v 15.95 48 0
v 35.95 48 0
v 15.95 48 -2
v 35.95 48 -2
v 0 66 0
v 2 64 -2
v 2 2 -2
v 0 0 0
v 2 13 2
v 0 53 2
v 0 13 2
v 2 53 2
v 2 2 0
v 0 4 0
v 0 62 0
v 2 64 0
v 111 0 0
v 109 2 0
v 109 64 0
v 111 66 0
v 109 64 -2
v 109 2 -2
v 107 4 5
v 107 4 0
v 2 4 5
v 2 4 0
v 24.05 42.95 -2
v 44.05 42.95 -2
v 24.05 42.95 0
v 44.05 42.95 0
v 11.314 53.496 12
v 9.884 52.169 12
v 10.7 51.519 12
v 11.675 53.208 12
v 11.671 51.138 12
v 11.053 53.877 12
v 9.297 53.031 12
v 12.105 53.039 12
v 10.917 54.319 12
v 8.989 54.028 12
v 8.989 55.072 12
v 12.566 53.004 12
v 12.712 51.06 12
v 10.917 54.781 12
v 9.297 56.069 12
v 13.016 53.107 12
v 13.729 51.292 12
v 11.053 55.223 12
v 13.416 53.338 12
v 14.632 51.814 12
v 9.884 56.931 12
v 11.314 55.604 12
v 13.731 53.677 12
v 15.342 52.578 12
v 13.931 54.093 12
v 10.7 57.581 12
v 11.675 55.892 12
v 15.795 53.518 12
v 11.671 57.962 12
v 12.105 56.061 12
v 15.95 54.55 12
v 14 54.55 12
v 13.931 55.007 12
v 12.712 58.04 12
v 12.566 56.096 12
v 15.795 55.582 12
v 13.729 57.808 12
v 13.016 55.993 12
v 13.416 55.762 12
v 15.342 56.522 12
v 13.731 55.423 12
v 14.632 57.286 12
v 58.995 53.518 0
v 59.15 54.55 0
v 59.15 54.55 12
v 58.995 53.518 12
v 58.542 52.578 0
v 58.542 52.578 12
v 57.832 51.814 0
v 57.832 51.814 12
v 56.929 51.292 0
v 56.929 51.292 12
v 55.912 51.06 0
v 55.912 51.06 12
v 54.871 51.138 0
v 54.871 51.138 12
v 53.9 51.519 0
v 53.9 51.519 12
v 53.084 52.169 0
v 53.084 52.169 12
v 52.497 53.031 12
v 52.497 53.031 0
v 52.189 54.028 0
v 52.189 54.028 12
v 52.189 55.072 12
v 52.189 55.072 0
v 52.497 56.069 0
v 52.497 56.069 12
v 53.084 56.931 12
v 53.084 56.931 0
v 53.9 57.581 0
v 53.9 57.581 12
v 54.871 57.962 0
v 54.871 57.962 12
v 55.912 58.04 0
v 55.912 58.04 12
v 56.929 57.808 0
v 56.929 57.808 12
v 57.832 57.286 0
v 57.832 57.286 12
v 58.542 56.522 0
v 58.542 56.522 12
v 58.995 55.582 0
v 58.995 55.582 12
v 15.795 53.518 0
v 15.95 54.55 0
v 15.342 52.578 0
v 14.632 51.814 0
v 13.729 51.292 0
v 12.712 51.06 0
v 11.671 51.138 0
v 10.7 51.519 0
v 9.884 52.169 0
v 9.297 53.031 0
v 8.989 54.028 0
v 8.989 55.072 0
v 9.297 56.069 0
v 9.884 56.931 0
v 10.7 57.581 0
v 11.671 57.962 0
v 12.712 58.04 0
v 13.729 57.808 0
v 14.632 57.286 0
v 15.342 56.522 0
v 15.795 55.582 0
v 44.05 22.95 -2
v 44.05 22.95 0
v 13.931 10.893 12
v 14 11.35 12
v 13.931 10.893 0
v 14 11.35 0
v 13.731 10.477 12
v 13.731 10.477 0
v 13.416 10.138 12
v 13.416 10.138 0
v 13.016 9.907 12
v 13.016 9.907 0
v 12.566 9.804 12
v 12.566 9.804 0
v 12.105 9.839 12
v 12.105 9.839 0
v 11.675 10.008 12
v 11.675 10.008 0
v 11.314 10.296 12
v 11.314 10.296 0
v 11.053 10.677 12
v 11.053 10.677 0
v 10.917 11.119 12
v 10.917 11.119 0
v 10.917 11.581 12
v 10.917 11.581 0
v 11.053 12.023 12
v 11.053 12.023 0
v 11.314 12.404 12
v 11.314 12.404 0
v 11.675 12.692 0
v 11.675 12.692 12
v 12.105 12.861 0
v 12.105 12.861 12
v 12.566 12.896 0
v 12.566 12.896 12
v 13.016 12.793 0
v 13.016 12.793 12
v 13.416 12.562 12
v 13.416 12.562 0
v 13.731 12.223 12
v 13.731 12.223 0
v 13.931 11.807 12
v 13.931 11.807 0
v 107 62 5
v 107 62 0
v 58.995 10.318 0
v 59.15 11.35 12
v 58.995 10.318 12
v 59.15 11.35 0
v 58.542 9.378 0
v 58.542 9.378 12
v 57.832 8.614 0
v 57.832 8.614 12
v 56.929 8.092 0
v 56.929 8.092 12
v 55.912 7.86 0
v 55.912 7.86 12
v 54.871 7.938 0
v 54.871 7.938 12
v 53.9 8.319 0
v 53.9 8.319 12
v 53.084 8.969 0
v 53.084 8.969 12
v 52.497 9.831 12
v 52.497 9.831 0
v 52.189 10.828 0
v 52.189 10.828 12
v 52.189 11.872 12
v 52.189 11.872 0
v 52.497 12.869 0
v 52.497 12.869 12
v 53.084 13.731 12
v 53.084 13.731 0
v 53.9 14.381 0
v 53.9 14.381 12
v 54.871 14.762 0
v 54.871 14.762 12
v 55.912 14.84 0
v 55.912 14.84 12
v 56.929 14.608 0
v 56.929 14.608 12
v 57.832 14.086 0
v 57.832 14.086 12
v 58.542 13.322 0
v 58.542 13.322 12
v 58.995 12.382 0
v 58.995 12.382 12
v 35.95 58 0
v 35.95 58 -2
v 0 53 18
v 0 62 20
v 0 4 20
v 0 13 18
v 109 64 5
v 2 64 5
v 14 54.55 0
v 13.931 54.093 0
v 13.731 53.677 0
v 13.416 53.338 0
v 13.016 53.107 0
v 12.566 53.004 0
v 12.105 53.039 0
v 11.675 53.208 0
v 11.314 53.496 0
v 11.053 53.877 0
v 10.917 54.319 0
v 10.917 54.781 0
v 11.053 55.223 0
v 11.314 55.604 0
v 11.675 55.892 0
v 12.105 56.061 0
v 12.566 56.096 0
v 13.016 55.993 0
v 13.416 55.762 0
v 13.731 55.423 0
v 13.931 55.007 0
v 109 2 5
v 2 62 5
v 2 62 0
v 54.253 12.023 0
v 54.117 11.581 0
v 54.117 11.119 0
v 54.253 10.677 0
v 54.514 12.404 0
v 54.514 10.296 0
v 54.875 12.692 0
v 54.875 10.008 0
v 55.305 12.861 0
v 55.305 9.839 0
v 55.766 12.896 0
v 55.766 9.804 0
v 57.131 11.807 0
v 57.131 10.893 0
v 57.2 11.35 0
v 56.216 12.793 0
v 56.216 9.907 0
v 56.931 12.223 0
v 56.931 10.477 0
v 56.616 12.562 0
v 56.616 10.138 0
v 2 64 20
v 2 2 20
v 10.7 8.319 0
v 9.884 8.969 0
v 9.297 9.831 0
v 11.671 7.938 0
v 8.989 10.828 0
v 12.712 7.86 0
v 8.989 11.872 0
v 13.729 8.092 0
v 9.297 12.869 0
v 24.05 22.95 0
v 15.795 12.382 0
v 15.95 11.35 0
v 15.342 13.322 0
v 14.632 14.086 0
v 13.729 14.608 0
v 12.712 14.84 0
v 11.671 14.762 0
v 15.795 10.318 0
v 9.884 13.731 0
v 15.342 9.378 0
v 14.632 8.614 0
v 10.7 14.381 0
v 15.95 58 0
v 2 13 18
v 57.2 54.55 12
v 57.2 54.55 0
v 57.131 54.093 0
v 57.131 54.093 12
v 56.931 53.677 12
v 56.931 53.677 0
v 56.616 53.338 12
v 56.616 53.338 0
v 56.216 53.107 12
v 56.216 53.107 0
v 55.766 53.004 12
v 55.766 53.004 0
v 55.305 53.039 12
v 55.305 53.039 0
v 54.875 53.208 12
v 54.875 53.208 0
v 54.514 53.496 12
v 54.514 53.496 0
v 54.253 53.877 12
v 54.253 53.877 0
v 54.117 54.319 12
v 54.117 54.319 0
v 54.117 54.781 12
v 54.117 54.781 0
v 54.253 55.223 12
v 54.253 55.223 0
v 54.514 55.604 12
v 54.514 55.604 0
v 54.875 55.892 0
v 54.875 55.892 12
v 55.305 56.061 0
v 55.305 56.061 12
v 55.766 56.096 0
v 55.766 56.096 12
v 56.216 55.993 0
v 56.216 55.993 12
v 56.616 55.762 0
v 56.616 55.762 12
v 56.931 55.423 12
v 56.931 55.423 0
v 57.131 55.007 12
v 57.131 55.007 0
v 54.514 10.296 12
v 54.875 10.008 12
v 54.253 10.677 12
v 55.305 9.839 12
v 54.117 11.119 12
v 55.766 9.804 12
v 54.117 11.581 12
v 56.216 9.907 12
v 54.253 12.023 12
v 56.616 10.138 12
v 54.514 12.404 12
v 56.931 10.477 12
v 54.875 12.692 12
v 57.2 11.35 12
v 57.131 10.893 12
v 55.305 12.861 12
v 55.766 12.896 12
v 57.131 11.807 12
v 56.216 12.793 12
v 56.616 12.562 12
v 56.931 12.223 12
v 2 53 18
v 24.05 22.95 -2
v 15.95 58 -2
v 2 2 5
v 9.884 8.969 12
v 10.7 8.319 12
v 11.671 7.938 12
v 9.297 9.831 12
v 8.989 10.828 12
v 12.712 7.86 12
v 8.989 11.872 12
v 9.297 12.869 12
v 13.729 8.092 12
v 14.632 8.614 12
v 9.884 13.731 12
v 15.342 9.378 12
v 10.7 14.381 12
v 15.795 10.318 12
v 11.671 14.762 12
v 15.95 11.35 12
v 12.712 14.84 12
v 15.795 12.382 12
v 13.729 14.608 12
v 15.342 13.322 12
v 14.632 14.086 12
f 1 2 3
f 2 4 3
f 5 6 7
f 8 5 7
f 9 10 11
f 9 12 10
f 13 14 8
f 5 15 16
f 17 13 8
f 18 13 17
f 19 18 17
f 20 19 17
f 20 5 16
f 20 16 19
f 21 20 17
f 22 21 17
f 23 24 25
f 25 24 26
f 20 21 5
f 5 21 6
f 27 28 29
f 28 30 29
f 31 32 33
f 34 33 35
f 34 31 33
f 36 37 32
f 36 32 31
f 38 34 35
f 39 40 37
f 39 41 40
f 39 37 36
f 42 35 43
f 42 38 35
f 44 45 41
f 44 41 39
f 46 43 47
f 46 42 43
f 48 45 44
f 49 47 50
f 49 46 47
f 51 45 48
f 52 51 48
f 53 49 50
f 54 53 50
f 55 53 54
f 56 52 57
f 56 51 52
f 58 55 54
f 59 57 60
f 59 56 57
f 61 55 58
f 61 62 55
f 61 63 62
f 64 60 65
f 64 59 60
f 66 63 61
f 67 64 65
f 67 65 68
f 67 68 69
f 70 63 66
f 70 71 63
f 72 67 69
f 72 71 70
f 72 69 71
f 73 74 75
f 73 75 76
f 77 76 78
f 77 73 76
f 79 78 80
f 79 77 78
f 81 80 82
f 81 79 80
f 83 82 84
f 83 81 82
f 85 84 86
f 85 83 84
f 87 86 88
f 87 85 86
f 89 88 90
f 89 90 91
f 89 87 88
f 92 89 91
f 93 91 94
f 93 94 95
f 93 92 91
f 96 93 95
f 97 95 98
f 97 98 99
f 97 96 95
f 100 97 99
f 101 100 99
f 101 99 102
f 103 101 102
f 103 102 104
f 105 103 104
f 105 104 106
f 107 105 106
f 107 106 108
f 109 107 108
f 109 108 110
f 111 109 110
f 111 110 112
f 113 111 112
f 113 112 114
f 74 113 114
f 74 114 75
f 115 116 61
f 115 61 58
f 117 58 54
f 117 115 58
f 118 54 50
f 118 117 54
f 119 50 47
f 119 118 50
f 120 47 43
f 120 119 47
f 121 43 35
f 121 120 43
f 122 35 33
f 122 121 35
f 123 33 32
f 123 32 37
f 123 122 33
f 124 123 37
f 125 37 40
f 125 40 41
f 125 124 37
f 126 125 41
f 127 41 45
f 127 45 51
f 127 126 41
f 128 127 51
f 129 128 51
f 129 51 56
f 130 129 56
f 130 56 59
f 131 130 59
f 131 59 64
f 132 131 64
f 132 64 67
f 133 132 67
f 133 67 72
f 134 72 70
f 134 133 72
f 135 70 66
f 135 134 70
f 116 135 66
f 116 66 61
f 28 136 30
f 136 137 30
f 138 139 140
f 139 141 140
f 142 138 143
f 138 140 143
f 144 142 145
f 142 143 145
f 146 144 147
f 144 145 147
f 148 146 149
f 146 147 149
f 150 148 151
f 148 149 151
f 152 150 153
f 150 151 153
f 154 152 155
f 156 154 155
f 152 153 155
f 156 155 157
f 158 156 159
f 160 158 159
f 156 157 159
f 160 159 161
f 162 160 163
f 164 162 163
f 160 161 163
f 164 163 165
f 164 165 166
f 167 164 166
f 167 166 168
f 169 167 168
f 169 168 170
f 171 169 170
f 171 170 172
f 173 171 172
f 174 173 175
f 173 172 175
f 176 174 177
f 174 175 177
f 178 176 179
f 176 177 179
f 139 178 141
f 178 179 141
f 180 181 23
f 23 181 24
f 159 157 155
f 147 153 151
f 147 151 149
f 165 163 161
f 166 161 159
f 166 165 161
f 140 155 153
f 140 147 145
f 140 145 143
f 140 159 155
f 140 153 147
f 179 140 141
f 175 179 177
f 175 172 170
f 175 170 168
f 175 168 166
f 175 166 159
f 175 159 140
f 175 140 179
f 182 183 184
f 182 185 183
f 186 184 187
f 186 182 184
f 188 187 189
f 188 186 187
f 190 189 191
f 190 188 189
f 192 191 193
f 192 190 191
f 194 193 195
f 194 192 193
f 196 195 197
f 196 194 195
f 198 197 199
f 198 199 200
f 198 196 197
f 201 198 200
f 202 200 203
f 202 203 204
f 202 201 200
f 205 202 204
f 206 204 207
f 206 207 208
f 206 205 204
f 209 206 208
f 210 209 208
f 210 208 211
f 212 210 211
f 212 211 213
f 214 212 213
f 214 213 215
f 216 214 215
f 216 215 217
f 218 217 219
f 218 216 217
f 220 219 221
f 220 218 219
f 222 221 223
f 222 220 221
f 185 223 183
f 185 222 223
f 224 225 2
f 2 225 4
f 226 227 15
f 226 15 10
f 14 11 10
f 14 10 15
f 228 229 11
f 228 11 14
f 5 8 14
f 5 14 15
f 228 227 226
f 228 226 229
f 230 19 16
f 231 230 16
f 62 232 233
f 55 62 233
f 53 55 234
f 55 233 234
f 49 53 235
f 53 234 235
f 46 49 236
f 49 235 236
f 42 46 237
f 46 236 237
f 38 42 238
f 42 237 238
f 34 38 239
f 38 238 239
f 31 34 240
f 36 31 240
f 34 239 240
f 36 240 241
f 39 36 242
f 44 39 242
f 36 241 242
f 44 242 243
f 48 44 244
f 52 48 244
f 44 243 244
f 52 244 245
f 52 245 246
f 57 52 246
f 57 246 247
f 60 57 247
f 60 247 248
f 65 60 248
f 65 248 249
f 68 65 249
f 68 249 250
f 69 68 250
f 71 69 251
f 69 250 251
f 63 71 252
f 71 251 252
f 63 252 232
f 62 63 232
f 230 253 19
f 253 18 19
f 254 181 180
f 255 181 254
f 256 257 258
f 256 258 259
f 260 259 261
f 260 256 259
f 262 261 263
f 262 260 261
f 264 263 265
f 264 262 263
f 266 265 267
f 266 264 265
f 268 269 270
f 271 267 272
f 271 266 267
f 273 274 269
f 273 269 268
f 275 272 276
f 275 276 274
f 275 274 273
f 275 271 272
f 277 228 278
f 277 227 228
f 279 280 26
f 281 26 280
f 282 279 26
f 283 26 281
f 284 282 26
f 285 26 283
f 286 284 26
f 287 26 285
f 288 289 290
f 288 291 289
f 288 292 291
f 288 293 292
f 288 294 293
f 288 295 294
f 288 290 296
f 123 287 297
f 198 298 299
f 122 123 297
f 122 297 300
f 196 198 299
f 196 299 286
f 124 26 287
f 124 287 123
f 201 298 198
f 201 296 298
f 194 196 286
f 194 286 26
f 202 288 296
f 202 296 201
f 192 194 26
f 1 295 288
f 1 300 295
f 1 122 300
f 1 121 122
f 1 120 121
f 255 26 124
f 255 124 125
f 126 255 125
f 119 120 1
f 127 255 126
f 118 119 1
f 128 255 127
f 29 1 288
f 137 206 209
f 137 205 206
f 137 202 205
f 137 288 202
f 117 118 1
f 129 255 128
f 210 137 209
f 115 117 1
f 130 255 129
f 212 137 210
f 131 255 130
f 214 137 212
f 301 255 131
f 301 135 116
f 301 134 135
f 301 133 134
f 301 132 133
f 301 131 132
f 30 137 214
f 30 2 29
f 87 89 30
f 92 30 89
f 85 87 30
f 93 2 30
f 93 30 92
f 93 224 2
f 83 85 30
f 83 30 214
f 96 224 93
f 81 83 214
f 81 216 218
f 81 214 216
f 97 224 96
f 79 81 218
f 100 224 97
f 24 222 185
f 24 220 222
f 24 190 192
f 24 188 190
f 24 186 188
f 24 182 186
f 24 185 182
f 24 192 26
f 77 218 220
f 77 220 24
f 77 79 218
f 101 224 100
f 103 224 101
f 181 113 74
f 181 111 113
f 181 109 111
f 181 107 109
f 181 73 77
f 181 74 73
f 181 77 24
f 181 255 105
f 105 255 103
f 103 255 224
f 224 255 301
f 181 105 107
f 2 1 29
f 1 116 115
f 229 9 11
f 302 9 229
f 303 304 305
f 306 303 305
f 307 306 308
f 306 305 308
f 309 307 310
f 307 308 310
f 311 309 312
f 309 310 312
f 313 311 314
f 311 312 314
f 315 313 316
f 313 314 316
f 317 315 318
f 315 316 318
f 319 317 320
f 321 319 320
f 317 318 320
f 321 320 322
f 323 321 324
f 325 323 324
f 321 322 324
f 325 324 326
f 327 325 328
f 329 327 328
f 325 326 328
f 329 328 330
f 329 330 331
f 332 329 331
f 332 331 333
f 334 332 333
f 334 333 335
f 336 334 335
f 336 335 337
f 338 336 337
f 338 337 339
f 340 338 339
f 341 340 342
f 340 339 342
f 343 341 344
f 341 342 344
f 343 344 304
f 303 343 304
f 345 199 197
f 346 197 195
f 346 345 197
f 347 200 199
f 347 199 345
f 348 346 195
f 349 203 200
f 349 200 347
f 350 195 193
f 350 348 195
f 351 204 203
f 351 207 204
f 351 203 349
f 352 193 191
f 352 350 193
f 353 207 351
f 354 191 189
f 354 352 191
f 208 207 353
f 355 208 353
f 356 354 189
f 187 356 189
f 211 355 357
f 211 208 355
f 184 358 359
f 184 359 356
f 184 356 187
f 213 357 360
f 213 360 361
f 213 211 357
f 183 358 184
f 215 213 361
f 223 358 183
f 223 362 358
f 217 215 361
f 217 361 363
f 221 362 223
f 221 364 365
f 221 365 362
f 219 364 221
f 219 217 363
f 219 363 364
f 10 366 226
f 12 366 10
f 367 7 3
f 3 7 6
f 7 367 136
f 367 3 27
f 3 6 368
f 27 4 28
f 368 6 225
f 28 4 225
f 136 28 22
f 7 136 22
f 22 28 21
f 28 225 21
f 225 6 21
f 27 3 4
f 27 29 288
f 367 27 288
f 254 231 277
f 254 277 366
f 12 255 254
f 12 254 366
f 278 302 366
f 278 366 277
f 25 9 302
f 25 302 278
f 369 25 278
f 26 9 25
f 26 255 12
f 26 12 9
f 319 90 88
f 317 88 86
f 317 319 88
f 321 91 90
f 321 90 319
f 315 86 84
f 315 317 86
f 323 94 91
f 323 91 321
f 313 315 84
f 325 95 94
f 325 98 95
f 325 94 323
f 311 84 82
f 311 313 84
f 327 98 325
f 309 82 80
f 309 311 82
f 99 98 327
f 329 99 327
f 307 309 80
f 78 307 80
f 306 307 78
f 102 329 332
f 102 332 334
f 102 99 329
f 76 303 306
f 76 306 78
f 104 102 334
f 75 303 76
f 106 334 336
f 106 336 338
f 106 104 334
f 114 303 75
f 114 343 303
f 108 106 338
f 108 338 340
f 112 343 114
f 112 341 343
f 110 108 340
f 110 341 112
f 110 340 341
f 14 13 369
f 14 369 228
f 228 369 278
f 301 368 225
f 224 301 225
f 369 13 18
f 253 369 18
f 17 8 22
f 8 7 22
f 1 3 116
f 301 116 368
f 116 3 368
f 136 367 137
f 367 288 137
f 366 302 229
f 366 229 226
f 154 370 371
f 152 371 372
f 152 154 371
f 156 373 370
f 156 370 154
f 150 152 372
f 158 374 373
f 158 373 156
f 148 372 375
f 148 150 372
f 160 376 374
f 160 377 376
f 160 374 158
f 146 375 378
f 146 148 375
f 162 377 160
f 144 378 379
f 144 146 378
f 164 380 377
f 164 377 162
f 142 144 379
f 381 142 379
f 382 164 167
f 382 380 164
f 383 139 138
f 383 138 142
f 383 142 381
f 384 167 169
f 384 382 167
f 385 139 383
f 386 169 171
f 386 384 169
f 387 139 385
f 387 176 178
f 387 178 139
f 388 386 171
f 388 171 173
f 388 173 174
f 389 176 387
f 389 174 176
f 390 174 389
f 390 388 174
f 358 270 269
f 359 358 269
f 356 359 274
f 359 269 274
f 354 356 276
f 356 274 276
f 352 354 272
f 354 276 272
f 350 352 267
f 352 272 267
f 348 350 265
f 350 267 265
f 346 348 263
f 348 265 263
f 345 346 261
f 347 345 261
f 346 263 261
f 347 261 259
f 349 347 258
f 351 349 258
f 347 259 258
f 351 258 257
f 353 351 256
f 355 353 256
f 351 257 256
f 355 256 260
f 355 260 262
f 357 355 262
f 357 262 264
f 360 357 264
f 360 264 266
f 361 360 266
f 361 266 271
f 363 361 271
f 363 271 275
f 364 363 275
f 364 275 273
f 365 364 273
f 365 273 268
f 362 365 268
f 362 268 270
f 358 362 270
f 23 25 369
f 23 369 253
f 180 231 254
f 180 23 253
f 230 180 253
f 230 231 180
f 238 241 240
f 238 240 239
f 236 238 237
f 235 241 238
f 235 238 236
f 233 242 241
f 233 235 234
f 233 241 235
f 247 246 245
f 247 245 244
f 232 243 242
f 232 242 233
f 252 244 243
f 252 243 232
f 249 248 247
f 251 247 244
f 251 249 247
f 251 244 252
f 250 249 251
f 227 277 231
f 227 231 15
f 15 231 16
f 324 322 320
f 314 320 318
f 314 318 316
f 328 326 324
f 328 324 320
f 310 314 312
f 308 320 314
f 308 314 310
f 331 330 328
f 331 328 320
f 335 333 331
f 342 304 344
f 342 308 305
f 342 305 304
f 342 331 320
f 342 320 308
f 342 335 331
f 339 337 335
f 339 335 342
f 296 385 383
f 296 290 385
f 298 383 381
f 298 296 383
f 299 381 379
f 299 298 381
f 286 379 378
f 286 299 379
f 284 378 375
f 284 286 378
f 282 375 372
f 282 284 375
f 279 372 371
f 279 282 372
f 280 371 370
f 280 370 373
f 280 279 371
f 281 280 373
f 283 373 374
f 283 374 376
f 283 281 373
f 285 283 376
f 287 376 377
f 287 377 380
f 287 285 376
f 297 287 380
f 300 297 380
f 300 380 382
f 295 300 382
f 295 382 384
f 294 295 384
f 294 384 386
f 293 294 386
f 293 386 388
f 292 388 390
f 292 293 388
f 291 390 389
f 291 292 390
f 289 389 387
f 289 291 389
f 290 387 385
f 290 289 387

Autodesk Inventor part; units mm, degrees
ref_plane "YZ Plane" through (0, 0, 0) normal (1, 0, 0) x (0, 1, 0)
ref_plane "XZ Plane" through (0, 0, 0) normal (0, 1, 0) x (-1, 0, 0)
ref_plane "XY Plane" through (0, 0, 0) normal (0, 0, 1) x (1, 0, 0)
sketch "Sketch1" plane through (0, 0, 0) normal (0, 0, 1) x (1, 0, 0)
  line L0 (0, 0) -> (111, 0)
  line L1 (111, 0) -> (111, 66)
  line L2 (111, 66) -> (0, 66)
  line L3 (0, 66) -> (0, 0)
  line L4 (2, 2) -> (109, 2)
  line L5 (109, 2) -> (109, 64)
  line L6 (109, 64) -> (2, 64)
  line L7 (2, 64) -> (2, 2)
  line L8 (2, 64) -> (107, 64)
  line L9 (107, 64) -> (107, 2)
  line L10 (107, 2) -> (2, 2)
  line L11 (2, 2) -> (2, 64)
  line L12 (2, 64) -> (0, 64)
  line L13 (0, 64) -> (0, 2)
  line L14 (0, 2) -> (2, 2)
  line L15 (2, 2) -> (2, 64)
  line L16 (2, 64) -> (107, 64)
  line L17 (107, 64) -> (107, 62)
  line L18 (107, 62) -> (2, 62)
  line L19 (2, 62) -> (2, 64)
  line L20 (2, 2) -> (107, 2)
  line L21 (107, 2) -> (107, 4)
  line L22 (107, 4) -> (2, 4)
  line L23 (2, 4) -> (2, 2)
  point P0 (2, 64)
  point P1 (2, 2)
  point P2 (107, 2)
  point P3 (2, 4)
  point P4 (2, 62)
  dimension "d0" = 111
  dimension "d1" = 66
  dimension "d2" = 107
  dimension "d3" = 2
  dimension "d4" = 2
  dimension "d5" = 62
  dimension "d6" = 105
  dimension "d8" = 0
  dimension "d9" = 0
  dimension "d10" = 0
  dimension "d56" = 105
  dimension "d57" = 2
  dimension "d58" = 105
  dimension "d59" = 2
extrude "Extrusion1" add sketch "Sketch1" against normal blind 2
extrude "Extrusion2" add sketch "Sketch1" along normal blind 5 contours L9 L6 L5 L4
extrude "Extrusion3" add sketch "Sketch1" along normal blind 20 contours L3 L12 L7 L14
sketch "Sketch2" plane through (0, 0, 0) normal (0, 0, 1) x (1, 0, 0)
  line L0 (9, 58) -> (59, 58)
  line L1 (59, 58) -> (59, 8)
  line L2 (59, 8) -> (9, 8)
  line L3 (9, 8) -> (9, 58)
  line L4 (0, 64) -> (0, 2) projected
  line L5 (2, 64) -> (107, 64) projected
  line L6 (12.45, 54.55) -> (55.65, 54.55)
  line L7 (55.65, 54.55) -> (55.65, 11.35)
  line L8 (55.65, 11.35) -> (12.45, 11.35)
  line L9 (12.45, 11.35) -> (12.45, 54.55)
  circle A0 centre (12.45, 54.55) radius 1.55
  circle A1 centre (55.65, 54.55) radius 1.55
  circle A2 centre (12.45, 11.35) radius 1.55
  circle A3 centre (55.65, 11.35) radius 1.55
  circle A4 centre (12.45, 54.55) radius 3.5
  circle A5 centre (55.65, 54.55) radius 3.5
  circle A6 centre (55.65, 11.35) radius 3.5
  circle A7 centre (12.45, 11.35) radius 3.5
  line L10 (15.95, 18) -> (35.95, 18)
  line L11 (35.95, 18) -> (35.95, 8)
  line L12 (35.95, 8) -> (15.95, 8)
  line L13 (15.95, 8) -> (15.95, 18)
  line L14 (12.45, 54.55) -> (55.65, 11.35)
  line L15 (55.65, 54.55) -> (12.45, 11.35)
  line L16 (24.05, 22.95) -> (44.05, 22.95)
  line L17 (44.05, 22.95) -> (44.05, 42.95)
  line L18 (44.05, 42.95) -> (24.05, 42.95)
  line L19 (24.05, 42.95) -> (24.05, 22.95)
  line L20 (24.05, 22.95) -> (44.05, 42.95) construction
  line L21 (44.05, 22.95) -> (24.05, 42.95) construction
  line L22 (15.95, 58) -> (35.95, 58)
  line L23 (35.95, 58) -> (35.95, 48)
  line L24 (35.95, 48) -> (15.95, 48)
  line L25 (15.95, 48) -> (15.95, 58)
  point P0 (0, 0)
  point P1 (13.0395, 58)
  point P2 (11.8605, 58)
  point P3 (9, 55.1395)
  point P4 (9, 53.9605)
  point P5 (9, 11.9395)
  point P6 (9, 10.7605)
  point P7 (11.4363, 8)
  point P8 (13.4637, 8)
  point P9 (54.6363, 8)
  point P10 (56.6637, 8)
  point P11 (59, 10.3363)
  point P12 (59, 12.3637)
  point P13 (59, 53.5363)
  point P14 (59, 55.5637)
  point P15 (56.2395, 58)
  point P16 (55.0605, 58)
  point P17 (34.05, 32.95)
  dimension "d19" = 50
  dimension "d20" = 50
  dimension "d21" = 9
  dimension "d22" = 6
  dimension "d23" = 43.2
  dimension "d24" = 43.2
  dimension "d25" = 3.45
  dimension "d26" = 3.45
  dimension "d27" = 3.1
  dimension "d28" = 3.1
  dimension "d29" = 3.1
  dimension "d30" = 3.1
  dimension "d31" = 7
  dimension "d32" = 7
  dimension "d33" = 7
  dimension "d34" = 7
  dimension "d47" = 20
  dimension "d48" = 0
  dimension "d49" = 10
  dimension "d50" = 20
  dimension "d51" = 20
  dimension "d65" = 20
  dimension "d66" = 10
  dimension "d67" = 0
extrude "Extrusion5" add sketch "Sketch2" along normal blind 12 contours A4 L6 A0 L9 L3 L0 | L0 A4 | A4 L14 A0 L6 | A5 L0 | L0 A5 L1 L7 A1 L6 | A4 L9 A0 L14 | L6 A1 L15 A5 | L3 A4 | A5 L1 | L15 A1 L7 A5 | A7 L15 A2 L9 | L9 A2 L8 A7 L2 L3 | L3 A7 | A7 L8 A2 L15 | A6 L1 | L1 A6 L2 L8 A3 L7 | L7 A3 L14 A6 | L14 A3 L8 A6 | L2 A7 | A6 L2
chamfer "Chamfer1" distance 2 angle 45 4 edges at (55.5, 66, -2) (0, 33, -2) (55.5, 0, -2) (111, 33, -2)
sketch "Sketch3" plane through (0, 2, 20) normal (-1, 0, 0) x (0, 0, 1)
  line L0 (-20, 62) -> (0, 62) projected
  line L1 (-20, 62) -> (-20, 0) projected
  line L2 (0, 62) -> (-20, 0)
  line L3 (0, 62) -> (0, 0) projected
  line L4 (0, 0) -> (-20, 62)
  line L5 (-2, 51) -> (-18, 51)
  line L6 (-18, 51) -> (-18, 11)
  line L7 (-18, 11) -> (-2, 11)
  line L8 (-2, 11) -> (-2, 51)
  line L9 (-2, 51) -> (-18, 11) construction
  line L10 (-18, 51) -> (-2, 11) construction
  point P0 (-20, -2)
  point P1 (-15, 62)
  point P2 (-10, 31)
  dimension "d43" = 16
  dimension "d44" = 40
extrude "Extrusion6" cut sketch "Sketch3" along normal mid plane 10 contours L5 L2 L4 | L4 L2 L7 L6 L5 | L5 L8 L7 L4 L2 | L2 L4 L7
extrude "Extrusion7" cut sketch "Sketch2" against normal blind 10 contours L18 L15 L14 | L14 L15 L19 | L17 L14 L15 | L14 L16 L15
extrude "Extrusion9" add sketch "Sketch1" along normal blind 5 contours L7 L22 L9 L4 | L6 L9 L18 L7
chamfer "Chamfer3" distance 2 angle 45 2 edges at (0, 2, 10) (0, 64, 10)
extrude "Extrusion10" cut sketch "Sketch2" along normal mid plane 10 contours L0 L23 L6 L25 | L6 L23 L24 L14 L25 | L14 L24 L25
equation "\"d0\" = capLength"
equation "\"d1\" = capWidth"
equation "\"d2\" = capLength - 2 * wallWidth"
equation "\"d3\" = wallWidth"
equation "\"d4\" = wallWidth"
equation "\"d5\" = capWidth - 2 * wallWidth"
equation "\"d6\" = capLength - 3 * wallWidth"
equation "\"d56\" = capLength - 3 * wallWidth"
equation "\"d57\" = wallWidth"
equation "\"d58\" = capLength - 3 * wallWidth"
equation "\"d59\" = wallWidth"
equation "\"d11\" = wallWidth"
equation "\"d13\" = wallsHeight"
equation "\"d15\" = height"
equation "\"d19\" = PCBWidth"
equation "\"d20\" = PCBWidth"
equation "\"d21\" = connectorsLength"
equation "\"d22\" = -0.5 * PCBWidth + 0.5 * capWidth - wallWidth"
equation "\"d23\" = widthBetweenHoles"
equation "\"d24\" = widthBetweenHoles"
equation "\"d25\" = holesDistance"
equation "\"d26\" = holesDistance"
equation "\"d27\" = dHoles"
equation "\"d28\" = dHoles"
equation "\"d29\" = dHoles"
equation "\"d30\" = dHoles"
equation "\"d31\" = dBonks"
equation "\"d32\" = dBonks"
equation "\"d33\" = dBonks"
equation "\"d34\" = dBonks"
equation "\"d47\" = cutoutLength"
equation "\"d49\" = cutoutWidth"
equation "\"d50\" = switchersWidth"
equation "\"d51\" = switchersWidth"
equation "\"d65\" = cutoutLength"
equation "\"d66\" = cutoutWidth"
equation "\"d43\" = hWindow"
equation "\"d44\" = wWindow"
equation "\"d60\" = wallsHeight"
equation "\"capWidth\" = 66"
equation "\"capLength\" = 111"
equation "\"wallWidth\" = 2"
equation "\"wallsHeight\" = 5"
equation "\"height\" = 20"
equation "\"dHoles\" = 3.1"
equation "\"dBonks\" = 7"
equation "\"PCBWidth\" = 50"
equation "\"connectorsLength\" = 9"
equation "\"widthBetweenHoles\" = 43.2"
equation "\"holesDistance\" = 3.45"
equation "\"hWindowCenter\" = 8"
equation "\"hWindow\" = 16"
equation "\"wWindow\" = 40"
equation "\"cutoutLength\" = 20"
equation "\"cutoutWidth\" = 10"
equation "\"switchersWidth\" = 20"
properties part number "Cap"
